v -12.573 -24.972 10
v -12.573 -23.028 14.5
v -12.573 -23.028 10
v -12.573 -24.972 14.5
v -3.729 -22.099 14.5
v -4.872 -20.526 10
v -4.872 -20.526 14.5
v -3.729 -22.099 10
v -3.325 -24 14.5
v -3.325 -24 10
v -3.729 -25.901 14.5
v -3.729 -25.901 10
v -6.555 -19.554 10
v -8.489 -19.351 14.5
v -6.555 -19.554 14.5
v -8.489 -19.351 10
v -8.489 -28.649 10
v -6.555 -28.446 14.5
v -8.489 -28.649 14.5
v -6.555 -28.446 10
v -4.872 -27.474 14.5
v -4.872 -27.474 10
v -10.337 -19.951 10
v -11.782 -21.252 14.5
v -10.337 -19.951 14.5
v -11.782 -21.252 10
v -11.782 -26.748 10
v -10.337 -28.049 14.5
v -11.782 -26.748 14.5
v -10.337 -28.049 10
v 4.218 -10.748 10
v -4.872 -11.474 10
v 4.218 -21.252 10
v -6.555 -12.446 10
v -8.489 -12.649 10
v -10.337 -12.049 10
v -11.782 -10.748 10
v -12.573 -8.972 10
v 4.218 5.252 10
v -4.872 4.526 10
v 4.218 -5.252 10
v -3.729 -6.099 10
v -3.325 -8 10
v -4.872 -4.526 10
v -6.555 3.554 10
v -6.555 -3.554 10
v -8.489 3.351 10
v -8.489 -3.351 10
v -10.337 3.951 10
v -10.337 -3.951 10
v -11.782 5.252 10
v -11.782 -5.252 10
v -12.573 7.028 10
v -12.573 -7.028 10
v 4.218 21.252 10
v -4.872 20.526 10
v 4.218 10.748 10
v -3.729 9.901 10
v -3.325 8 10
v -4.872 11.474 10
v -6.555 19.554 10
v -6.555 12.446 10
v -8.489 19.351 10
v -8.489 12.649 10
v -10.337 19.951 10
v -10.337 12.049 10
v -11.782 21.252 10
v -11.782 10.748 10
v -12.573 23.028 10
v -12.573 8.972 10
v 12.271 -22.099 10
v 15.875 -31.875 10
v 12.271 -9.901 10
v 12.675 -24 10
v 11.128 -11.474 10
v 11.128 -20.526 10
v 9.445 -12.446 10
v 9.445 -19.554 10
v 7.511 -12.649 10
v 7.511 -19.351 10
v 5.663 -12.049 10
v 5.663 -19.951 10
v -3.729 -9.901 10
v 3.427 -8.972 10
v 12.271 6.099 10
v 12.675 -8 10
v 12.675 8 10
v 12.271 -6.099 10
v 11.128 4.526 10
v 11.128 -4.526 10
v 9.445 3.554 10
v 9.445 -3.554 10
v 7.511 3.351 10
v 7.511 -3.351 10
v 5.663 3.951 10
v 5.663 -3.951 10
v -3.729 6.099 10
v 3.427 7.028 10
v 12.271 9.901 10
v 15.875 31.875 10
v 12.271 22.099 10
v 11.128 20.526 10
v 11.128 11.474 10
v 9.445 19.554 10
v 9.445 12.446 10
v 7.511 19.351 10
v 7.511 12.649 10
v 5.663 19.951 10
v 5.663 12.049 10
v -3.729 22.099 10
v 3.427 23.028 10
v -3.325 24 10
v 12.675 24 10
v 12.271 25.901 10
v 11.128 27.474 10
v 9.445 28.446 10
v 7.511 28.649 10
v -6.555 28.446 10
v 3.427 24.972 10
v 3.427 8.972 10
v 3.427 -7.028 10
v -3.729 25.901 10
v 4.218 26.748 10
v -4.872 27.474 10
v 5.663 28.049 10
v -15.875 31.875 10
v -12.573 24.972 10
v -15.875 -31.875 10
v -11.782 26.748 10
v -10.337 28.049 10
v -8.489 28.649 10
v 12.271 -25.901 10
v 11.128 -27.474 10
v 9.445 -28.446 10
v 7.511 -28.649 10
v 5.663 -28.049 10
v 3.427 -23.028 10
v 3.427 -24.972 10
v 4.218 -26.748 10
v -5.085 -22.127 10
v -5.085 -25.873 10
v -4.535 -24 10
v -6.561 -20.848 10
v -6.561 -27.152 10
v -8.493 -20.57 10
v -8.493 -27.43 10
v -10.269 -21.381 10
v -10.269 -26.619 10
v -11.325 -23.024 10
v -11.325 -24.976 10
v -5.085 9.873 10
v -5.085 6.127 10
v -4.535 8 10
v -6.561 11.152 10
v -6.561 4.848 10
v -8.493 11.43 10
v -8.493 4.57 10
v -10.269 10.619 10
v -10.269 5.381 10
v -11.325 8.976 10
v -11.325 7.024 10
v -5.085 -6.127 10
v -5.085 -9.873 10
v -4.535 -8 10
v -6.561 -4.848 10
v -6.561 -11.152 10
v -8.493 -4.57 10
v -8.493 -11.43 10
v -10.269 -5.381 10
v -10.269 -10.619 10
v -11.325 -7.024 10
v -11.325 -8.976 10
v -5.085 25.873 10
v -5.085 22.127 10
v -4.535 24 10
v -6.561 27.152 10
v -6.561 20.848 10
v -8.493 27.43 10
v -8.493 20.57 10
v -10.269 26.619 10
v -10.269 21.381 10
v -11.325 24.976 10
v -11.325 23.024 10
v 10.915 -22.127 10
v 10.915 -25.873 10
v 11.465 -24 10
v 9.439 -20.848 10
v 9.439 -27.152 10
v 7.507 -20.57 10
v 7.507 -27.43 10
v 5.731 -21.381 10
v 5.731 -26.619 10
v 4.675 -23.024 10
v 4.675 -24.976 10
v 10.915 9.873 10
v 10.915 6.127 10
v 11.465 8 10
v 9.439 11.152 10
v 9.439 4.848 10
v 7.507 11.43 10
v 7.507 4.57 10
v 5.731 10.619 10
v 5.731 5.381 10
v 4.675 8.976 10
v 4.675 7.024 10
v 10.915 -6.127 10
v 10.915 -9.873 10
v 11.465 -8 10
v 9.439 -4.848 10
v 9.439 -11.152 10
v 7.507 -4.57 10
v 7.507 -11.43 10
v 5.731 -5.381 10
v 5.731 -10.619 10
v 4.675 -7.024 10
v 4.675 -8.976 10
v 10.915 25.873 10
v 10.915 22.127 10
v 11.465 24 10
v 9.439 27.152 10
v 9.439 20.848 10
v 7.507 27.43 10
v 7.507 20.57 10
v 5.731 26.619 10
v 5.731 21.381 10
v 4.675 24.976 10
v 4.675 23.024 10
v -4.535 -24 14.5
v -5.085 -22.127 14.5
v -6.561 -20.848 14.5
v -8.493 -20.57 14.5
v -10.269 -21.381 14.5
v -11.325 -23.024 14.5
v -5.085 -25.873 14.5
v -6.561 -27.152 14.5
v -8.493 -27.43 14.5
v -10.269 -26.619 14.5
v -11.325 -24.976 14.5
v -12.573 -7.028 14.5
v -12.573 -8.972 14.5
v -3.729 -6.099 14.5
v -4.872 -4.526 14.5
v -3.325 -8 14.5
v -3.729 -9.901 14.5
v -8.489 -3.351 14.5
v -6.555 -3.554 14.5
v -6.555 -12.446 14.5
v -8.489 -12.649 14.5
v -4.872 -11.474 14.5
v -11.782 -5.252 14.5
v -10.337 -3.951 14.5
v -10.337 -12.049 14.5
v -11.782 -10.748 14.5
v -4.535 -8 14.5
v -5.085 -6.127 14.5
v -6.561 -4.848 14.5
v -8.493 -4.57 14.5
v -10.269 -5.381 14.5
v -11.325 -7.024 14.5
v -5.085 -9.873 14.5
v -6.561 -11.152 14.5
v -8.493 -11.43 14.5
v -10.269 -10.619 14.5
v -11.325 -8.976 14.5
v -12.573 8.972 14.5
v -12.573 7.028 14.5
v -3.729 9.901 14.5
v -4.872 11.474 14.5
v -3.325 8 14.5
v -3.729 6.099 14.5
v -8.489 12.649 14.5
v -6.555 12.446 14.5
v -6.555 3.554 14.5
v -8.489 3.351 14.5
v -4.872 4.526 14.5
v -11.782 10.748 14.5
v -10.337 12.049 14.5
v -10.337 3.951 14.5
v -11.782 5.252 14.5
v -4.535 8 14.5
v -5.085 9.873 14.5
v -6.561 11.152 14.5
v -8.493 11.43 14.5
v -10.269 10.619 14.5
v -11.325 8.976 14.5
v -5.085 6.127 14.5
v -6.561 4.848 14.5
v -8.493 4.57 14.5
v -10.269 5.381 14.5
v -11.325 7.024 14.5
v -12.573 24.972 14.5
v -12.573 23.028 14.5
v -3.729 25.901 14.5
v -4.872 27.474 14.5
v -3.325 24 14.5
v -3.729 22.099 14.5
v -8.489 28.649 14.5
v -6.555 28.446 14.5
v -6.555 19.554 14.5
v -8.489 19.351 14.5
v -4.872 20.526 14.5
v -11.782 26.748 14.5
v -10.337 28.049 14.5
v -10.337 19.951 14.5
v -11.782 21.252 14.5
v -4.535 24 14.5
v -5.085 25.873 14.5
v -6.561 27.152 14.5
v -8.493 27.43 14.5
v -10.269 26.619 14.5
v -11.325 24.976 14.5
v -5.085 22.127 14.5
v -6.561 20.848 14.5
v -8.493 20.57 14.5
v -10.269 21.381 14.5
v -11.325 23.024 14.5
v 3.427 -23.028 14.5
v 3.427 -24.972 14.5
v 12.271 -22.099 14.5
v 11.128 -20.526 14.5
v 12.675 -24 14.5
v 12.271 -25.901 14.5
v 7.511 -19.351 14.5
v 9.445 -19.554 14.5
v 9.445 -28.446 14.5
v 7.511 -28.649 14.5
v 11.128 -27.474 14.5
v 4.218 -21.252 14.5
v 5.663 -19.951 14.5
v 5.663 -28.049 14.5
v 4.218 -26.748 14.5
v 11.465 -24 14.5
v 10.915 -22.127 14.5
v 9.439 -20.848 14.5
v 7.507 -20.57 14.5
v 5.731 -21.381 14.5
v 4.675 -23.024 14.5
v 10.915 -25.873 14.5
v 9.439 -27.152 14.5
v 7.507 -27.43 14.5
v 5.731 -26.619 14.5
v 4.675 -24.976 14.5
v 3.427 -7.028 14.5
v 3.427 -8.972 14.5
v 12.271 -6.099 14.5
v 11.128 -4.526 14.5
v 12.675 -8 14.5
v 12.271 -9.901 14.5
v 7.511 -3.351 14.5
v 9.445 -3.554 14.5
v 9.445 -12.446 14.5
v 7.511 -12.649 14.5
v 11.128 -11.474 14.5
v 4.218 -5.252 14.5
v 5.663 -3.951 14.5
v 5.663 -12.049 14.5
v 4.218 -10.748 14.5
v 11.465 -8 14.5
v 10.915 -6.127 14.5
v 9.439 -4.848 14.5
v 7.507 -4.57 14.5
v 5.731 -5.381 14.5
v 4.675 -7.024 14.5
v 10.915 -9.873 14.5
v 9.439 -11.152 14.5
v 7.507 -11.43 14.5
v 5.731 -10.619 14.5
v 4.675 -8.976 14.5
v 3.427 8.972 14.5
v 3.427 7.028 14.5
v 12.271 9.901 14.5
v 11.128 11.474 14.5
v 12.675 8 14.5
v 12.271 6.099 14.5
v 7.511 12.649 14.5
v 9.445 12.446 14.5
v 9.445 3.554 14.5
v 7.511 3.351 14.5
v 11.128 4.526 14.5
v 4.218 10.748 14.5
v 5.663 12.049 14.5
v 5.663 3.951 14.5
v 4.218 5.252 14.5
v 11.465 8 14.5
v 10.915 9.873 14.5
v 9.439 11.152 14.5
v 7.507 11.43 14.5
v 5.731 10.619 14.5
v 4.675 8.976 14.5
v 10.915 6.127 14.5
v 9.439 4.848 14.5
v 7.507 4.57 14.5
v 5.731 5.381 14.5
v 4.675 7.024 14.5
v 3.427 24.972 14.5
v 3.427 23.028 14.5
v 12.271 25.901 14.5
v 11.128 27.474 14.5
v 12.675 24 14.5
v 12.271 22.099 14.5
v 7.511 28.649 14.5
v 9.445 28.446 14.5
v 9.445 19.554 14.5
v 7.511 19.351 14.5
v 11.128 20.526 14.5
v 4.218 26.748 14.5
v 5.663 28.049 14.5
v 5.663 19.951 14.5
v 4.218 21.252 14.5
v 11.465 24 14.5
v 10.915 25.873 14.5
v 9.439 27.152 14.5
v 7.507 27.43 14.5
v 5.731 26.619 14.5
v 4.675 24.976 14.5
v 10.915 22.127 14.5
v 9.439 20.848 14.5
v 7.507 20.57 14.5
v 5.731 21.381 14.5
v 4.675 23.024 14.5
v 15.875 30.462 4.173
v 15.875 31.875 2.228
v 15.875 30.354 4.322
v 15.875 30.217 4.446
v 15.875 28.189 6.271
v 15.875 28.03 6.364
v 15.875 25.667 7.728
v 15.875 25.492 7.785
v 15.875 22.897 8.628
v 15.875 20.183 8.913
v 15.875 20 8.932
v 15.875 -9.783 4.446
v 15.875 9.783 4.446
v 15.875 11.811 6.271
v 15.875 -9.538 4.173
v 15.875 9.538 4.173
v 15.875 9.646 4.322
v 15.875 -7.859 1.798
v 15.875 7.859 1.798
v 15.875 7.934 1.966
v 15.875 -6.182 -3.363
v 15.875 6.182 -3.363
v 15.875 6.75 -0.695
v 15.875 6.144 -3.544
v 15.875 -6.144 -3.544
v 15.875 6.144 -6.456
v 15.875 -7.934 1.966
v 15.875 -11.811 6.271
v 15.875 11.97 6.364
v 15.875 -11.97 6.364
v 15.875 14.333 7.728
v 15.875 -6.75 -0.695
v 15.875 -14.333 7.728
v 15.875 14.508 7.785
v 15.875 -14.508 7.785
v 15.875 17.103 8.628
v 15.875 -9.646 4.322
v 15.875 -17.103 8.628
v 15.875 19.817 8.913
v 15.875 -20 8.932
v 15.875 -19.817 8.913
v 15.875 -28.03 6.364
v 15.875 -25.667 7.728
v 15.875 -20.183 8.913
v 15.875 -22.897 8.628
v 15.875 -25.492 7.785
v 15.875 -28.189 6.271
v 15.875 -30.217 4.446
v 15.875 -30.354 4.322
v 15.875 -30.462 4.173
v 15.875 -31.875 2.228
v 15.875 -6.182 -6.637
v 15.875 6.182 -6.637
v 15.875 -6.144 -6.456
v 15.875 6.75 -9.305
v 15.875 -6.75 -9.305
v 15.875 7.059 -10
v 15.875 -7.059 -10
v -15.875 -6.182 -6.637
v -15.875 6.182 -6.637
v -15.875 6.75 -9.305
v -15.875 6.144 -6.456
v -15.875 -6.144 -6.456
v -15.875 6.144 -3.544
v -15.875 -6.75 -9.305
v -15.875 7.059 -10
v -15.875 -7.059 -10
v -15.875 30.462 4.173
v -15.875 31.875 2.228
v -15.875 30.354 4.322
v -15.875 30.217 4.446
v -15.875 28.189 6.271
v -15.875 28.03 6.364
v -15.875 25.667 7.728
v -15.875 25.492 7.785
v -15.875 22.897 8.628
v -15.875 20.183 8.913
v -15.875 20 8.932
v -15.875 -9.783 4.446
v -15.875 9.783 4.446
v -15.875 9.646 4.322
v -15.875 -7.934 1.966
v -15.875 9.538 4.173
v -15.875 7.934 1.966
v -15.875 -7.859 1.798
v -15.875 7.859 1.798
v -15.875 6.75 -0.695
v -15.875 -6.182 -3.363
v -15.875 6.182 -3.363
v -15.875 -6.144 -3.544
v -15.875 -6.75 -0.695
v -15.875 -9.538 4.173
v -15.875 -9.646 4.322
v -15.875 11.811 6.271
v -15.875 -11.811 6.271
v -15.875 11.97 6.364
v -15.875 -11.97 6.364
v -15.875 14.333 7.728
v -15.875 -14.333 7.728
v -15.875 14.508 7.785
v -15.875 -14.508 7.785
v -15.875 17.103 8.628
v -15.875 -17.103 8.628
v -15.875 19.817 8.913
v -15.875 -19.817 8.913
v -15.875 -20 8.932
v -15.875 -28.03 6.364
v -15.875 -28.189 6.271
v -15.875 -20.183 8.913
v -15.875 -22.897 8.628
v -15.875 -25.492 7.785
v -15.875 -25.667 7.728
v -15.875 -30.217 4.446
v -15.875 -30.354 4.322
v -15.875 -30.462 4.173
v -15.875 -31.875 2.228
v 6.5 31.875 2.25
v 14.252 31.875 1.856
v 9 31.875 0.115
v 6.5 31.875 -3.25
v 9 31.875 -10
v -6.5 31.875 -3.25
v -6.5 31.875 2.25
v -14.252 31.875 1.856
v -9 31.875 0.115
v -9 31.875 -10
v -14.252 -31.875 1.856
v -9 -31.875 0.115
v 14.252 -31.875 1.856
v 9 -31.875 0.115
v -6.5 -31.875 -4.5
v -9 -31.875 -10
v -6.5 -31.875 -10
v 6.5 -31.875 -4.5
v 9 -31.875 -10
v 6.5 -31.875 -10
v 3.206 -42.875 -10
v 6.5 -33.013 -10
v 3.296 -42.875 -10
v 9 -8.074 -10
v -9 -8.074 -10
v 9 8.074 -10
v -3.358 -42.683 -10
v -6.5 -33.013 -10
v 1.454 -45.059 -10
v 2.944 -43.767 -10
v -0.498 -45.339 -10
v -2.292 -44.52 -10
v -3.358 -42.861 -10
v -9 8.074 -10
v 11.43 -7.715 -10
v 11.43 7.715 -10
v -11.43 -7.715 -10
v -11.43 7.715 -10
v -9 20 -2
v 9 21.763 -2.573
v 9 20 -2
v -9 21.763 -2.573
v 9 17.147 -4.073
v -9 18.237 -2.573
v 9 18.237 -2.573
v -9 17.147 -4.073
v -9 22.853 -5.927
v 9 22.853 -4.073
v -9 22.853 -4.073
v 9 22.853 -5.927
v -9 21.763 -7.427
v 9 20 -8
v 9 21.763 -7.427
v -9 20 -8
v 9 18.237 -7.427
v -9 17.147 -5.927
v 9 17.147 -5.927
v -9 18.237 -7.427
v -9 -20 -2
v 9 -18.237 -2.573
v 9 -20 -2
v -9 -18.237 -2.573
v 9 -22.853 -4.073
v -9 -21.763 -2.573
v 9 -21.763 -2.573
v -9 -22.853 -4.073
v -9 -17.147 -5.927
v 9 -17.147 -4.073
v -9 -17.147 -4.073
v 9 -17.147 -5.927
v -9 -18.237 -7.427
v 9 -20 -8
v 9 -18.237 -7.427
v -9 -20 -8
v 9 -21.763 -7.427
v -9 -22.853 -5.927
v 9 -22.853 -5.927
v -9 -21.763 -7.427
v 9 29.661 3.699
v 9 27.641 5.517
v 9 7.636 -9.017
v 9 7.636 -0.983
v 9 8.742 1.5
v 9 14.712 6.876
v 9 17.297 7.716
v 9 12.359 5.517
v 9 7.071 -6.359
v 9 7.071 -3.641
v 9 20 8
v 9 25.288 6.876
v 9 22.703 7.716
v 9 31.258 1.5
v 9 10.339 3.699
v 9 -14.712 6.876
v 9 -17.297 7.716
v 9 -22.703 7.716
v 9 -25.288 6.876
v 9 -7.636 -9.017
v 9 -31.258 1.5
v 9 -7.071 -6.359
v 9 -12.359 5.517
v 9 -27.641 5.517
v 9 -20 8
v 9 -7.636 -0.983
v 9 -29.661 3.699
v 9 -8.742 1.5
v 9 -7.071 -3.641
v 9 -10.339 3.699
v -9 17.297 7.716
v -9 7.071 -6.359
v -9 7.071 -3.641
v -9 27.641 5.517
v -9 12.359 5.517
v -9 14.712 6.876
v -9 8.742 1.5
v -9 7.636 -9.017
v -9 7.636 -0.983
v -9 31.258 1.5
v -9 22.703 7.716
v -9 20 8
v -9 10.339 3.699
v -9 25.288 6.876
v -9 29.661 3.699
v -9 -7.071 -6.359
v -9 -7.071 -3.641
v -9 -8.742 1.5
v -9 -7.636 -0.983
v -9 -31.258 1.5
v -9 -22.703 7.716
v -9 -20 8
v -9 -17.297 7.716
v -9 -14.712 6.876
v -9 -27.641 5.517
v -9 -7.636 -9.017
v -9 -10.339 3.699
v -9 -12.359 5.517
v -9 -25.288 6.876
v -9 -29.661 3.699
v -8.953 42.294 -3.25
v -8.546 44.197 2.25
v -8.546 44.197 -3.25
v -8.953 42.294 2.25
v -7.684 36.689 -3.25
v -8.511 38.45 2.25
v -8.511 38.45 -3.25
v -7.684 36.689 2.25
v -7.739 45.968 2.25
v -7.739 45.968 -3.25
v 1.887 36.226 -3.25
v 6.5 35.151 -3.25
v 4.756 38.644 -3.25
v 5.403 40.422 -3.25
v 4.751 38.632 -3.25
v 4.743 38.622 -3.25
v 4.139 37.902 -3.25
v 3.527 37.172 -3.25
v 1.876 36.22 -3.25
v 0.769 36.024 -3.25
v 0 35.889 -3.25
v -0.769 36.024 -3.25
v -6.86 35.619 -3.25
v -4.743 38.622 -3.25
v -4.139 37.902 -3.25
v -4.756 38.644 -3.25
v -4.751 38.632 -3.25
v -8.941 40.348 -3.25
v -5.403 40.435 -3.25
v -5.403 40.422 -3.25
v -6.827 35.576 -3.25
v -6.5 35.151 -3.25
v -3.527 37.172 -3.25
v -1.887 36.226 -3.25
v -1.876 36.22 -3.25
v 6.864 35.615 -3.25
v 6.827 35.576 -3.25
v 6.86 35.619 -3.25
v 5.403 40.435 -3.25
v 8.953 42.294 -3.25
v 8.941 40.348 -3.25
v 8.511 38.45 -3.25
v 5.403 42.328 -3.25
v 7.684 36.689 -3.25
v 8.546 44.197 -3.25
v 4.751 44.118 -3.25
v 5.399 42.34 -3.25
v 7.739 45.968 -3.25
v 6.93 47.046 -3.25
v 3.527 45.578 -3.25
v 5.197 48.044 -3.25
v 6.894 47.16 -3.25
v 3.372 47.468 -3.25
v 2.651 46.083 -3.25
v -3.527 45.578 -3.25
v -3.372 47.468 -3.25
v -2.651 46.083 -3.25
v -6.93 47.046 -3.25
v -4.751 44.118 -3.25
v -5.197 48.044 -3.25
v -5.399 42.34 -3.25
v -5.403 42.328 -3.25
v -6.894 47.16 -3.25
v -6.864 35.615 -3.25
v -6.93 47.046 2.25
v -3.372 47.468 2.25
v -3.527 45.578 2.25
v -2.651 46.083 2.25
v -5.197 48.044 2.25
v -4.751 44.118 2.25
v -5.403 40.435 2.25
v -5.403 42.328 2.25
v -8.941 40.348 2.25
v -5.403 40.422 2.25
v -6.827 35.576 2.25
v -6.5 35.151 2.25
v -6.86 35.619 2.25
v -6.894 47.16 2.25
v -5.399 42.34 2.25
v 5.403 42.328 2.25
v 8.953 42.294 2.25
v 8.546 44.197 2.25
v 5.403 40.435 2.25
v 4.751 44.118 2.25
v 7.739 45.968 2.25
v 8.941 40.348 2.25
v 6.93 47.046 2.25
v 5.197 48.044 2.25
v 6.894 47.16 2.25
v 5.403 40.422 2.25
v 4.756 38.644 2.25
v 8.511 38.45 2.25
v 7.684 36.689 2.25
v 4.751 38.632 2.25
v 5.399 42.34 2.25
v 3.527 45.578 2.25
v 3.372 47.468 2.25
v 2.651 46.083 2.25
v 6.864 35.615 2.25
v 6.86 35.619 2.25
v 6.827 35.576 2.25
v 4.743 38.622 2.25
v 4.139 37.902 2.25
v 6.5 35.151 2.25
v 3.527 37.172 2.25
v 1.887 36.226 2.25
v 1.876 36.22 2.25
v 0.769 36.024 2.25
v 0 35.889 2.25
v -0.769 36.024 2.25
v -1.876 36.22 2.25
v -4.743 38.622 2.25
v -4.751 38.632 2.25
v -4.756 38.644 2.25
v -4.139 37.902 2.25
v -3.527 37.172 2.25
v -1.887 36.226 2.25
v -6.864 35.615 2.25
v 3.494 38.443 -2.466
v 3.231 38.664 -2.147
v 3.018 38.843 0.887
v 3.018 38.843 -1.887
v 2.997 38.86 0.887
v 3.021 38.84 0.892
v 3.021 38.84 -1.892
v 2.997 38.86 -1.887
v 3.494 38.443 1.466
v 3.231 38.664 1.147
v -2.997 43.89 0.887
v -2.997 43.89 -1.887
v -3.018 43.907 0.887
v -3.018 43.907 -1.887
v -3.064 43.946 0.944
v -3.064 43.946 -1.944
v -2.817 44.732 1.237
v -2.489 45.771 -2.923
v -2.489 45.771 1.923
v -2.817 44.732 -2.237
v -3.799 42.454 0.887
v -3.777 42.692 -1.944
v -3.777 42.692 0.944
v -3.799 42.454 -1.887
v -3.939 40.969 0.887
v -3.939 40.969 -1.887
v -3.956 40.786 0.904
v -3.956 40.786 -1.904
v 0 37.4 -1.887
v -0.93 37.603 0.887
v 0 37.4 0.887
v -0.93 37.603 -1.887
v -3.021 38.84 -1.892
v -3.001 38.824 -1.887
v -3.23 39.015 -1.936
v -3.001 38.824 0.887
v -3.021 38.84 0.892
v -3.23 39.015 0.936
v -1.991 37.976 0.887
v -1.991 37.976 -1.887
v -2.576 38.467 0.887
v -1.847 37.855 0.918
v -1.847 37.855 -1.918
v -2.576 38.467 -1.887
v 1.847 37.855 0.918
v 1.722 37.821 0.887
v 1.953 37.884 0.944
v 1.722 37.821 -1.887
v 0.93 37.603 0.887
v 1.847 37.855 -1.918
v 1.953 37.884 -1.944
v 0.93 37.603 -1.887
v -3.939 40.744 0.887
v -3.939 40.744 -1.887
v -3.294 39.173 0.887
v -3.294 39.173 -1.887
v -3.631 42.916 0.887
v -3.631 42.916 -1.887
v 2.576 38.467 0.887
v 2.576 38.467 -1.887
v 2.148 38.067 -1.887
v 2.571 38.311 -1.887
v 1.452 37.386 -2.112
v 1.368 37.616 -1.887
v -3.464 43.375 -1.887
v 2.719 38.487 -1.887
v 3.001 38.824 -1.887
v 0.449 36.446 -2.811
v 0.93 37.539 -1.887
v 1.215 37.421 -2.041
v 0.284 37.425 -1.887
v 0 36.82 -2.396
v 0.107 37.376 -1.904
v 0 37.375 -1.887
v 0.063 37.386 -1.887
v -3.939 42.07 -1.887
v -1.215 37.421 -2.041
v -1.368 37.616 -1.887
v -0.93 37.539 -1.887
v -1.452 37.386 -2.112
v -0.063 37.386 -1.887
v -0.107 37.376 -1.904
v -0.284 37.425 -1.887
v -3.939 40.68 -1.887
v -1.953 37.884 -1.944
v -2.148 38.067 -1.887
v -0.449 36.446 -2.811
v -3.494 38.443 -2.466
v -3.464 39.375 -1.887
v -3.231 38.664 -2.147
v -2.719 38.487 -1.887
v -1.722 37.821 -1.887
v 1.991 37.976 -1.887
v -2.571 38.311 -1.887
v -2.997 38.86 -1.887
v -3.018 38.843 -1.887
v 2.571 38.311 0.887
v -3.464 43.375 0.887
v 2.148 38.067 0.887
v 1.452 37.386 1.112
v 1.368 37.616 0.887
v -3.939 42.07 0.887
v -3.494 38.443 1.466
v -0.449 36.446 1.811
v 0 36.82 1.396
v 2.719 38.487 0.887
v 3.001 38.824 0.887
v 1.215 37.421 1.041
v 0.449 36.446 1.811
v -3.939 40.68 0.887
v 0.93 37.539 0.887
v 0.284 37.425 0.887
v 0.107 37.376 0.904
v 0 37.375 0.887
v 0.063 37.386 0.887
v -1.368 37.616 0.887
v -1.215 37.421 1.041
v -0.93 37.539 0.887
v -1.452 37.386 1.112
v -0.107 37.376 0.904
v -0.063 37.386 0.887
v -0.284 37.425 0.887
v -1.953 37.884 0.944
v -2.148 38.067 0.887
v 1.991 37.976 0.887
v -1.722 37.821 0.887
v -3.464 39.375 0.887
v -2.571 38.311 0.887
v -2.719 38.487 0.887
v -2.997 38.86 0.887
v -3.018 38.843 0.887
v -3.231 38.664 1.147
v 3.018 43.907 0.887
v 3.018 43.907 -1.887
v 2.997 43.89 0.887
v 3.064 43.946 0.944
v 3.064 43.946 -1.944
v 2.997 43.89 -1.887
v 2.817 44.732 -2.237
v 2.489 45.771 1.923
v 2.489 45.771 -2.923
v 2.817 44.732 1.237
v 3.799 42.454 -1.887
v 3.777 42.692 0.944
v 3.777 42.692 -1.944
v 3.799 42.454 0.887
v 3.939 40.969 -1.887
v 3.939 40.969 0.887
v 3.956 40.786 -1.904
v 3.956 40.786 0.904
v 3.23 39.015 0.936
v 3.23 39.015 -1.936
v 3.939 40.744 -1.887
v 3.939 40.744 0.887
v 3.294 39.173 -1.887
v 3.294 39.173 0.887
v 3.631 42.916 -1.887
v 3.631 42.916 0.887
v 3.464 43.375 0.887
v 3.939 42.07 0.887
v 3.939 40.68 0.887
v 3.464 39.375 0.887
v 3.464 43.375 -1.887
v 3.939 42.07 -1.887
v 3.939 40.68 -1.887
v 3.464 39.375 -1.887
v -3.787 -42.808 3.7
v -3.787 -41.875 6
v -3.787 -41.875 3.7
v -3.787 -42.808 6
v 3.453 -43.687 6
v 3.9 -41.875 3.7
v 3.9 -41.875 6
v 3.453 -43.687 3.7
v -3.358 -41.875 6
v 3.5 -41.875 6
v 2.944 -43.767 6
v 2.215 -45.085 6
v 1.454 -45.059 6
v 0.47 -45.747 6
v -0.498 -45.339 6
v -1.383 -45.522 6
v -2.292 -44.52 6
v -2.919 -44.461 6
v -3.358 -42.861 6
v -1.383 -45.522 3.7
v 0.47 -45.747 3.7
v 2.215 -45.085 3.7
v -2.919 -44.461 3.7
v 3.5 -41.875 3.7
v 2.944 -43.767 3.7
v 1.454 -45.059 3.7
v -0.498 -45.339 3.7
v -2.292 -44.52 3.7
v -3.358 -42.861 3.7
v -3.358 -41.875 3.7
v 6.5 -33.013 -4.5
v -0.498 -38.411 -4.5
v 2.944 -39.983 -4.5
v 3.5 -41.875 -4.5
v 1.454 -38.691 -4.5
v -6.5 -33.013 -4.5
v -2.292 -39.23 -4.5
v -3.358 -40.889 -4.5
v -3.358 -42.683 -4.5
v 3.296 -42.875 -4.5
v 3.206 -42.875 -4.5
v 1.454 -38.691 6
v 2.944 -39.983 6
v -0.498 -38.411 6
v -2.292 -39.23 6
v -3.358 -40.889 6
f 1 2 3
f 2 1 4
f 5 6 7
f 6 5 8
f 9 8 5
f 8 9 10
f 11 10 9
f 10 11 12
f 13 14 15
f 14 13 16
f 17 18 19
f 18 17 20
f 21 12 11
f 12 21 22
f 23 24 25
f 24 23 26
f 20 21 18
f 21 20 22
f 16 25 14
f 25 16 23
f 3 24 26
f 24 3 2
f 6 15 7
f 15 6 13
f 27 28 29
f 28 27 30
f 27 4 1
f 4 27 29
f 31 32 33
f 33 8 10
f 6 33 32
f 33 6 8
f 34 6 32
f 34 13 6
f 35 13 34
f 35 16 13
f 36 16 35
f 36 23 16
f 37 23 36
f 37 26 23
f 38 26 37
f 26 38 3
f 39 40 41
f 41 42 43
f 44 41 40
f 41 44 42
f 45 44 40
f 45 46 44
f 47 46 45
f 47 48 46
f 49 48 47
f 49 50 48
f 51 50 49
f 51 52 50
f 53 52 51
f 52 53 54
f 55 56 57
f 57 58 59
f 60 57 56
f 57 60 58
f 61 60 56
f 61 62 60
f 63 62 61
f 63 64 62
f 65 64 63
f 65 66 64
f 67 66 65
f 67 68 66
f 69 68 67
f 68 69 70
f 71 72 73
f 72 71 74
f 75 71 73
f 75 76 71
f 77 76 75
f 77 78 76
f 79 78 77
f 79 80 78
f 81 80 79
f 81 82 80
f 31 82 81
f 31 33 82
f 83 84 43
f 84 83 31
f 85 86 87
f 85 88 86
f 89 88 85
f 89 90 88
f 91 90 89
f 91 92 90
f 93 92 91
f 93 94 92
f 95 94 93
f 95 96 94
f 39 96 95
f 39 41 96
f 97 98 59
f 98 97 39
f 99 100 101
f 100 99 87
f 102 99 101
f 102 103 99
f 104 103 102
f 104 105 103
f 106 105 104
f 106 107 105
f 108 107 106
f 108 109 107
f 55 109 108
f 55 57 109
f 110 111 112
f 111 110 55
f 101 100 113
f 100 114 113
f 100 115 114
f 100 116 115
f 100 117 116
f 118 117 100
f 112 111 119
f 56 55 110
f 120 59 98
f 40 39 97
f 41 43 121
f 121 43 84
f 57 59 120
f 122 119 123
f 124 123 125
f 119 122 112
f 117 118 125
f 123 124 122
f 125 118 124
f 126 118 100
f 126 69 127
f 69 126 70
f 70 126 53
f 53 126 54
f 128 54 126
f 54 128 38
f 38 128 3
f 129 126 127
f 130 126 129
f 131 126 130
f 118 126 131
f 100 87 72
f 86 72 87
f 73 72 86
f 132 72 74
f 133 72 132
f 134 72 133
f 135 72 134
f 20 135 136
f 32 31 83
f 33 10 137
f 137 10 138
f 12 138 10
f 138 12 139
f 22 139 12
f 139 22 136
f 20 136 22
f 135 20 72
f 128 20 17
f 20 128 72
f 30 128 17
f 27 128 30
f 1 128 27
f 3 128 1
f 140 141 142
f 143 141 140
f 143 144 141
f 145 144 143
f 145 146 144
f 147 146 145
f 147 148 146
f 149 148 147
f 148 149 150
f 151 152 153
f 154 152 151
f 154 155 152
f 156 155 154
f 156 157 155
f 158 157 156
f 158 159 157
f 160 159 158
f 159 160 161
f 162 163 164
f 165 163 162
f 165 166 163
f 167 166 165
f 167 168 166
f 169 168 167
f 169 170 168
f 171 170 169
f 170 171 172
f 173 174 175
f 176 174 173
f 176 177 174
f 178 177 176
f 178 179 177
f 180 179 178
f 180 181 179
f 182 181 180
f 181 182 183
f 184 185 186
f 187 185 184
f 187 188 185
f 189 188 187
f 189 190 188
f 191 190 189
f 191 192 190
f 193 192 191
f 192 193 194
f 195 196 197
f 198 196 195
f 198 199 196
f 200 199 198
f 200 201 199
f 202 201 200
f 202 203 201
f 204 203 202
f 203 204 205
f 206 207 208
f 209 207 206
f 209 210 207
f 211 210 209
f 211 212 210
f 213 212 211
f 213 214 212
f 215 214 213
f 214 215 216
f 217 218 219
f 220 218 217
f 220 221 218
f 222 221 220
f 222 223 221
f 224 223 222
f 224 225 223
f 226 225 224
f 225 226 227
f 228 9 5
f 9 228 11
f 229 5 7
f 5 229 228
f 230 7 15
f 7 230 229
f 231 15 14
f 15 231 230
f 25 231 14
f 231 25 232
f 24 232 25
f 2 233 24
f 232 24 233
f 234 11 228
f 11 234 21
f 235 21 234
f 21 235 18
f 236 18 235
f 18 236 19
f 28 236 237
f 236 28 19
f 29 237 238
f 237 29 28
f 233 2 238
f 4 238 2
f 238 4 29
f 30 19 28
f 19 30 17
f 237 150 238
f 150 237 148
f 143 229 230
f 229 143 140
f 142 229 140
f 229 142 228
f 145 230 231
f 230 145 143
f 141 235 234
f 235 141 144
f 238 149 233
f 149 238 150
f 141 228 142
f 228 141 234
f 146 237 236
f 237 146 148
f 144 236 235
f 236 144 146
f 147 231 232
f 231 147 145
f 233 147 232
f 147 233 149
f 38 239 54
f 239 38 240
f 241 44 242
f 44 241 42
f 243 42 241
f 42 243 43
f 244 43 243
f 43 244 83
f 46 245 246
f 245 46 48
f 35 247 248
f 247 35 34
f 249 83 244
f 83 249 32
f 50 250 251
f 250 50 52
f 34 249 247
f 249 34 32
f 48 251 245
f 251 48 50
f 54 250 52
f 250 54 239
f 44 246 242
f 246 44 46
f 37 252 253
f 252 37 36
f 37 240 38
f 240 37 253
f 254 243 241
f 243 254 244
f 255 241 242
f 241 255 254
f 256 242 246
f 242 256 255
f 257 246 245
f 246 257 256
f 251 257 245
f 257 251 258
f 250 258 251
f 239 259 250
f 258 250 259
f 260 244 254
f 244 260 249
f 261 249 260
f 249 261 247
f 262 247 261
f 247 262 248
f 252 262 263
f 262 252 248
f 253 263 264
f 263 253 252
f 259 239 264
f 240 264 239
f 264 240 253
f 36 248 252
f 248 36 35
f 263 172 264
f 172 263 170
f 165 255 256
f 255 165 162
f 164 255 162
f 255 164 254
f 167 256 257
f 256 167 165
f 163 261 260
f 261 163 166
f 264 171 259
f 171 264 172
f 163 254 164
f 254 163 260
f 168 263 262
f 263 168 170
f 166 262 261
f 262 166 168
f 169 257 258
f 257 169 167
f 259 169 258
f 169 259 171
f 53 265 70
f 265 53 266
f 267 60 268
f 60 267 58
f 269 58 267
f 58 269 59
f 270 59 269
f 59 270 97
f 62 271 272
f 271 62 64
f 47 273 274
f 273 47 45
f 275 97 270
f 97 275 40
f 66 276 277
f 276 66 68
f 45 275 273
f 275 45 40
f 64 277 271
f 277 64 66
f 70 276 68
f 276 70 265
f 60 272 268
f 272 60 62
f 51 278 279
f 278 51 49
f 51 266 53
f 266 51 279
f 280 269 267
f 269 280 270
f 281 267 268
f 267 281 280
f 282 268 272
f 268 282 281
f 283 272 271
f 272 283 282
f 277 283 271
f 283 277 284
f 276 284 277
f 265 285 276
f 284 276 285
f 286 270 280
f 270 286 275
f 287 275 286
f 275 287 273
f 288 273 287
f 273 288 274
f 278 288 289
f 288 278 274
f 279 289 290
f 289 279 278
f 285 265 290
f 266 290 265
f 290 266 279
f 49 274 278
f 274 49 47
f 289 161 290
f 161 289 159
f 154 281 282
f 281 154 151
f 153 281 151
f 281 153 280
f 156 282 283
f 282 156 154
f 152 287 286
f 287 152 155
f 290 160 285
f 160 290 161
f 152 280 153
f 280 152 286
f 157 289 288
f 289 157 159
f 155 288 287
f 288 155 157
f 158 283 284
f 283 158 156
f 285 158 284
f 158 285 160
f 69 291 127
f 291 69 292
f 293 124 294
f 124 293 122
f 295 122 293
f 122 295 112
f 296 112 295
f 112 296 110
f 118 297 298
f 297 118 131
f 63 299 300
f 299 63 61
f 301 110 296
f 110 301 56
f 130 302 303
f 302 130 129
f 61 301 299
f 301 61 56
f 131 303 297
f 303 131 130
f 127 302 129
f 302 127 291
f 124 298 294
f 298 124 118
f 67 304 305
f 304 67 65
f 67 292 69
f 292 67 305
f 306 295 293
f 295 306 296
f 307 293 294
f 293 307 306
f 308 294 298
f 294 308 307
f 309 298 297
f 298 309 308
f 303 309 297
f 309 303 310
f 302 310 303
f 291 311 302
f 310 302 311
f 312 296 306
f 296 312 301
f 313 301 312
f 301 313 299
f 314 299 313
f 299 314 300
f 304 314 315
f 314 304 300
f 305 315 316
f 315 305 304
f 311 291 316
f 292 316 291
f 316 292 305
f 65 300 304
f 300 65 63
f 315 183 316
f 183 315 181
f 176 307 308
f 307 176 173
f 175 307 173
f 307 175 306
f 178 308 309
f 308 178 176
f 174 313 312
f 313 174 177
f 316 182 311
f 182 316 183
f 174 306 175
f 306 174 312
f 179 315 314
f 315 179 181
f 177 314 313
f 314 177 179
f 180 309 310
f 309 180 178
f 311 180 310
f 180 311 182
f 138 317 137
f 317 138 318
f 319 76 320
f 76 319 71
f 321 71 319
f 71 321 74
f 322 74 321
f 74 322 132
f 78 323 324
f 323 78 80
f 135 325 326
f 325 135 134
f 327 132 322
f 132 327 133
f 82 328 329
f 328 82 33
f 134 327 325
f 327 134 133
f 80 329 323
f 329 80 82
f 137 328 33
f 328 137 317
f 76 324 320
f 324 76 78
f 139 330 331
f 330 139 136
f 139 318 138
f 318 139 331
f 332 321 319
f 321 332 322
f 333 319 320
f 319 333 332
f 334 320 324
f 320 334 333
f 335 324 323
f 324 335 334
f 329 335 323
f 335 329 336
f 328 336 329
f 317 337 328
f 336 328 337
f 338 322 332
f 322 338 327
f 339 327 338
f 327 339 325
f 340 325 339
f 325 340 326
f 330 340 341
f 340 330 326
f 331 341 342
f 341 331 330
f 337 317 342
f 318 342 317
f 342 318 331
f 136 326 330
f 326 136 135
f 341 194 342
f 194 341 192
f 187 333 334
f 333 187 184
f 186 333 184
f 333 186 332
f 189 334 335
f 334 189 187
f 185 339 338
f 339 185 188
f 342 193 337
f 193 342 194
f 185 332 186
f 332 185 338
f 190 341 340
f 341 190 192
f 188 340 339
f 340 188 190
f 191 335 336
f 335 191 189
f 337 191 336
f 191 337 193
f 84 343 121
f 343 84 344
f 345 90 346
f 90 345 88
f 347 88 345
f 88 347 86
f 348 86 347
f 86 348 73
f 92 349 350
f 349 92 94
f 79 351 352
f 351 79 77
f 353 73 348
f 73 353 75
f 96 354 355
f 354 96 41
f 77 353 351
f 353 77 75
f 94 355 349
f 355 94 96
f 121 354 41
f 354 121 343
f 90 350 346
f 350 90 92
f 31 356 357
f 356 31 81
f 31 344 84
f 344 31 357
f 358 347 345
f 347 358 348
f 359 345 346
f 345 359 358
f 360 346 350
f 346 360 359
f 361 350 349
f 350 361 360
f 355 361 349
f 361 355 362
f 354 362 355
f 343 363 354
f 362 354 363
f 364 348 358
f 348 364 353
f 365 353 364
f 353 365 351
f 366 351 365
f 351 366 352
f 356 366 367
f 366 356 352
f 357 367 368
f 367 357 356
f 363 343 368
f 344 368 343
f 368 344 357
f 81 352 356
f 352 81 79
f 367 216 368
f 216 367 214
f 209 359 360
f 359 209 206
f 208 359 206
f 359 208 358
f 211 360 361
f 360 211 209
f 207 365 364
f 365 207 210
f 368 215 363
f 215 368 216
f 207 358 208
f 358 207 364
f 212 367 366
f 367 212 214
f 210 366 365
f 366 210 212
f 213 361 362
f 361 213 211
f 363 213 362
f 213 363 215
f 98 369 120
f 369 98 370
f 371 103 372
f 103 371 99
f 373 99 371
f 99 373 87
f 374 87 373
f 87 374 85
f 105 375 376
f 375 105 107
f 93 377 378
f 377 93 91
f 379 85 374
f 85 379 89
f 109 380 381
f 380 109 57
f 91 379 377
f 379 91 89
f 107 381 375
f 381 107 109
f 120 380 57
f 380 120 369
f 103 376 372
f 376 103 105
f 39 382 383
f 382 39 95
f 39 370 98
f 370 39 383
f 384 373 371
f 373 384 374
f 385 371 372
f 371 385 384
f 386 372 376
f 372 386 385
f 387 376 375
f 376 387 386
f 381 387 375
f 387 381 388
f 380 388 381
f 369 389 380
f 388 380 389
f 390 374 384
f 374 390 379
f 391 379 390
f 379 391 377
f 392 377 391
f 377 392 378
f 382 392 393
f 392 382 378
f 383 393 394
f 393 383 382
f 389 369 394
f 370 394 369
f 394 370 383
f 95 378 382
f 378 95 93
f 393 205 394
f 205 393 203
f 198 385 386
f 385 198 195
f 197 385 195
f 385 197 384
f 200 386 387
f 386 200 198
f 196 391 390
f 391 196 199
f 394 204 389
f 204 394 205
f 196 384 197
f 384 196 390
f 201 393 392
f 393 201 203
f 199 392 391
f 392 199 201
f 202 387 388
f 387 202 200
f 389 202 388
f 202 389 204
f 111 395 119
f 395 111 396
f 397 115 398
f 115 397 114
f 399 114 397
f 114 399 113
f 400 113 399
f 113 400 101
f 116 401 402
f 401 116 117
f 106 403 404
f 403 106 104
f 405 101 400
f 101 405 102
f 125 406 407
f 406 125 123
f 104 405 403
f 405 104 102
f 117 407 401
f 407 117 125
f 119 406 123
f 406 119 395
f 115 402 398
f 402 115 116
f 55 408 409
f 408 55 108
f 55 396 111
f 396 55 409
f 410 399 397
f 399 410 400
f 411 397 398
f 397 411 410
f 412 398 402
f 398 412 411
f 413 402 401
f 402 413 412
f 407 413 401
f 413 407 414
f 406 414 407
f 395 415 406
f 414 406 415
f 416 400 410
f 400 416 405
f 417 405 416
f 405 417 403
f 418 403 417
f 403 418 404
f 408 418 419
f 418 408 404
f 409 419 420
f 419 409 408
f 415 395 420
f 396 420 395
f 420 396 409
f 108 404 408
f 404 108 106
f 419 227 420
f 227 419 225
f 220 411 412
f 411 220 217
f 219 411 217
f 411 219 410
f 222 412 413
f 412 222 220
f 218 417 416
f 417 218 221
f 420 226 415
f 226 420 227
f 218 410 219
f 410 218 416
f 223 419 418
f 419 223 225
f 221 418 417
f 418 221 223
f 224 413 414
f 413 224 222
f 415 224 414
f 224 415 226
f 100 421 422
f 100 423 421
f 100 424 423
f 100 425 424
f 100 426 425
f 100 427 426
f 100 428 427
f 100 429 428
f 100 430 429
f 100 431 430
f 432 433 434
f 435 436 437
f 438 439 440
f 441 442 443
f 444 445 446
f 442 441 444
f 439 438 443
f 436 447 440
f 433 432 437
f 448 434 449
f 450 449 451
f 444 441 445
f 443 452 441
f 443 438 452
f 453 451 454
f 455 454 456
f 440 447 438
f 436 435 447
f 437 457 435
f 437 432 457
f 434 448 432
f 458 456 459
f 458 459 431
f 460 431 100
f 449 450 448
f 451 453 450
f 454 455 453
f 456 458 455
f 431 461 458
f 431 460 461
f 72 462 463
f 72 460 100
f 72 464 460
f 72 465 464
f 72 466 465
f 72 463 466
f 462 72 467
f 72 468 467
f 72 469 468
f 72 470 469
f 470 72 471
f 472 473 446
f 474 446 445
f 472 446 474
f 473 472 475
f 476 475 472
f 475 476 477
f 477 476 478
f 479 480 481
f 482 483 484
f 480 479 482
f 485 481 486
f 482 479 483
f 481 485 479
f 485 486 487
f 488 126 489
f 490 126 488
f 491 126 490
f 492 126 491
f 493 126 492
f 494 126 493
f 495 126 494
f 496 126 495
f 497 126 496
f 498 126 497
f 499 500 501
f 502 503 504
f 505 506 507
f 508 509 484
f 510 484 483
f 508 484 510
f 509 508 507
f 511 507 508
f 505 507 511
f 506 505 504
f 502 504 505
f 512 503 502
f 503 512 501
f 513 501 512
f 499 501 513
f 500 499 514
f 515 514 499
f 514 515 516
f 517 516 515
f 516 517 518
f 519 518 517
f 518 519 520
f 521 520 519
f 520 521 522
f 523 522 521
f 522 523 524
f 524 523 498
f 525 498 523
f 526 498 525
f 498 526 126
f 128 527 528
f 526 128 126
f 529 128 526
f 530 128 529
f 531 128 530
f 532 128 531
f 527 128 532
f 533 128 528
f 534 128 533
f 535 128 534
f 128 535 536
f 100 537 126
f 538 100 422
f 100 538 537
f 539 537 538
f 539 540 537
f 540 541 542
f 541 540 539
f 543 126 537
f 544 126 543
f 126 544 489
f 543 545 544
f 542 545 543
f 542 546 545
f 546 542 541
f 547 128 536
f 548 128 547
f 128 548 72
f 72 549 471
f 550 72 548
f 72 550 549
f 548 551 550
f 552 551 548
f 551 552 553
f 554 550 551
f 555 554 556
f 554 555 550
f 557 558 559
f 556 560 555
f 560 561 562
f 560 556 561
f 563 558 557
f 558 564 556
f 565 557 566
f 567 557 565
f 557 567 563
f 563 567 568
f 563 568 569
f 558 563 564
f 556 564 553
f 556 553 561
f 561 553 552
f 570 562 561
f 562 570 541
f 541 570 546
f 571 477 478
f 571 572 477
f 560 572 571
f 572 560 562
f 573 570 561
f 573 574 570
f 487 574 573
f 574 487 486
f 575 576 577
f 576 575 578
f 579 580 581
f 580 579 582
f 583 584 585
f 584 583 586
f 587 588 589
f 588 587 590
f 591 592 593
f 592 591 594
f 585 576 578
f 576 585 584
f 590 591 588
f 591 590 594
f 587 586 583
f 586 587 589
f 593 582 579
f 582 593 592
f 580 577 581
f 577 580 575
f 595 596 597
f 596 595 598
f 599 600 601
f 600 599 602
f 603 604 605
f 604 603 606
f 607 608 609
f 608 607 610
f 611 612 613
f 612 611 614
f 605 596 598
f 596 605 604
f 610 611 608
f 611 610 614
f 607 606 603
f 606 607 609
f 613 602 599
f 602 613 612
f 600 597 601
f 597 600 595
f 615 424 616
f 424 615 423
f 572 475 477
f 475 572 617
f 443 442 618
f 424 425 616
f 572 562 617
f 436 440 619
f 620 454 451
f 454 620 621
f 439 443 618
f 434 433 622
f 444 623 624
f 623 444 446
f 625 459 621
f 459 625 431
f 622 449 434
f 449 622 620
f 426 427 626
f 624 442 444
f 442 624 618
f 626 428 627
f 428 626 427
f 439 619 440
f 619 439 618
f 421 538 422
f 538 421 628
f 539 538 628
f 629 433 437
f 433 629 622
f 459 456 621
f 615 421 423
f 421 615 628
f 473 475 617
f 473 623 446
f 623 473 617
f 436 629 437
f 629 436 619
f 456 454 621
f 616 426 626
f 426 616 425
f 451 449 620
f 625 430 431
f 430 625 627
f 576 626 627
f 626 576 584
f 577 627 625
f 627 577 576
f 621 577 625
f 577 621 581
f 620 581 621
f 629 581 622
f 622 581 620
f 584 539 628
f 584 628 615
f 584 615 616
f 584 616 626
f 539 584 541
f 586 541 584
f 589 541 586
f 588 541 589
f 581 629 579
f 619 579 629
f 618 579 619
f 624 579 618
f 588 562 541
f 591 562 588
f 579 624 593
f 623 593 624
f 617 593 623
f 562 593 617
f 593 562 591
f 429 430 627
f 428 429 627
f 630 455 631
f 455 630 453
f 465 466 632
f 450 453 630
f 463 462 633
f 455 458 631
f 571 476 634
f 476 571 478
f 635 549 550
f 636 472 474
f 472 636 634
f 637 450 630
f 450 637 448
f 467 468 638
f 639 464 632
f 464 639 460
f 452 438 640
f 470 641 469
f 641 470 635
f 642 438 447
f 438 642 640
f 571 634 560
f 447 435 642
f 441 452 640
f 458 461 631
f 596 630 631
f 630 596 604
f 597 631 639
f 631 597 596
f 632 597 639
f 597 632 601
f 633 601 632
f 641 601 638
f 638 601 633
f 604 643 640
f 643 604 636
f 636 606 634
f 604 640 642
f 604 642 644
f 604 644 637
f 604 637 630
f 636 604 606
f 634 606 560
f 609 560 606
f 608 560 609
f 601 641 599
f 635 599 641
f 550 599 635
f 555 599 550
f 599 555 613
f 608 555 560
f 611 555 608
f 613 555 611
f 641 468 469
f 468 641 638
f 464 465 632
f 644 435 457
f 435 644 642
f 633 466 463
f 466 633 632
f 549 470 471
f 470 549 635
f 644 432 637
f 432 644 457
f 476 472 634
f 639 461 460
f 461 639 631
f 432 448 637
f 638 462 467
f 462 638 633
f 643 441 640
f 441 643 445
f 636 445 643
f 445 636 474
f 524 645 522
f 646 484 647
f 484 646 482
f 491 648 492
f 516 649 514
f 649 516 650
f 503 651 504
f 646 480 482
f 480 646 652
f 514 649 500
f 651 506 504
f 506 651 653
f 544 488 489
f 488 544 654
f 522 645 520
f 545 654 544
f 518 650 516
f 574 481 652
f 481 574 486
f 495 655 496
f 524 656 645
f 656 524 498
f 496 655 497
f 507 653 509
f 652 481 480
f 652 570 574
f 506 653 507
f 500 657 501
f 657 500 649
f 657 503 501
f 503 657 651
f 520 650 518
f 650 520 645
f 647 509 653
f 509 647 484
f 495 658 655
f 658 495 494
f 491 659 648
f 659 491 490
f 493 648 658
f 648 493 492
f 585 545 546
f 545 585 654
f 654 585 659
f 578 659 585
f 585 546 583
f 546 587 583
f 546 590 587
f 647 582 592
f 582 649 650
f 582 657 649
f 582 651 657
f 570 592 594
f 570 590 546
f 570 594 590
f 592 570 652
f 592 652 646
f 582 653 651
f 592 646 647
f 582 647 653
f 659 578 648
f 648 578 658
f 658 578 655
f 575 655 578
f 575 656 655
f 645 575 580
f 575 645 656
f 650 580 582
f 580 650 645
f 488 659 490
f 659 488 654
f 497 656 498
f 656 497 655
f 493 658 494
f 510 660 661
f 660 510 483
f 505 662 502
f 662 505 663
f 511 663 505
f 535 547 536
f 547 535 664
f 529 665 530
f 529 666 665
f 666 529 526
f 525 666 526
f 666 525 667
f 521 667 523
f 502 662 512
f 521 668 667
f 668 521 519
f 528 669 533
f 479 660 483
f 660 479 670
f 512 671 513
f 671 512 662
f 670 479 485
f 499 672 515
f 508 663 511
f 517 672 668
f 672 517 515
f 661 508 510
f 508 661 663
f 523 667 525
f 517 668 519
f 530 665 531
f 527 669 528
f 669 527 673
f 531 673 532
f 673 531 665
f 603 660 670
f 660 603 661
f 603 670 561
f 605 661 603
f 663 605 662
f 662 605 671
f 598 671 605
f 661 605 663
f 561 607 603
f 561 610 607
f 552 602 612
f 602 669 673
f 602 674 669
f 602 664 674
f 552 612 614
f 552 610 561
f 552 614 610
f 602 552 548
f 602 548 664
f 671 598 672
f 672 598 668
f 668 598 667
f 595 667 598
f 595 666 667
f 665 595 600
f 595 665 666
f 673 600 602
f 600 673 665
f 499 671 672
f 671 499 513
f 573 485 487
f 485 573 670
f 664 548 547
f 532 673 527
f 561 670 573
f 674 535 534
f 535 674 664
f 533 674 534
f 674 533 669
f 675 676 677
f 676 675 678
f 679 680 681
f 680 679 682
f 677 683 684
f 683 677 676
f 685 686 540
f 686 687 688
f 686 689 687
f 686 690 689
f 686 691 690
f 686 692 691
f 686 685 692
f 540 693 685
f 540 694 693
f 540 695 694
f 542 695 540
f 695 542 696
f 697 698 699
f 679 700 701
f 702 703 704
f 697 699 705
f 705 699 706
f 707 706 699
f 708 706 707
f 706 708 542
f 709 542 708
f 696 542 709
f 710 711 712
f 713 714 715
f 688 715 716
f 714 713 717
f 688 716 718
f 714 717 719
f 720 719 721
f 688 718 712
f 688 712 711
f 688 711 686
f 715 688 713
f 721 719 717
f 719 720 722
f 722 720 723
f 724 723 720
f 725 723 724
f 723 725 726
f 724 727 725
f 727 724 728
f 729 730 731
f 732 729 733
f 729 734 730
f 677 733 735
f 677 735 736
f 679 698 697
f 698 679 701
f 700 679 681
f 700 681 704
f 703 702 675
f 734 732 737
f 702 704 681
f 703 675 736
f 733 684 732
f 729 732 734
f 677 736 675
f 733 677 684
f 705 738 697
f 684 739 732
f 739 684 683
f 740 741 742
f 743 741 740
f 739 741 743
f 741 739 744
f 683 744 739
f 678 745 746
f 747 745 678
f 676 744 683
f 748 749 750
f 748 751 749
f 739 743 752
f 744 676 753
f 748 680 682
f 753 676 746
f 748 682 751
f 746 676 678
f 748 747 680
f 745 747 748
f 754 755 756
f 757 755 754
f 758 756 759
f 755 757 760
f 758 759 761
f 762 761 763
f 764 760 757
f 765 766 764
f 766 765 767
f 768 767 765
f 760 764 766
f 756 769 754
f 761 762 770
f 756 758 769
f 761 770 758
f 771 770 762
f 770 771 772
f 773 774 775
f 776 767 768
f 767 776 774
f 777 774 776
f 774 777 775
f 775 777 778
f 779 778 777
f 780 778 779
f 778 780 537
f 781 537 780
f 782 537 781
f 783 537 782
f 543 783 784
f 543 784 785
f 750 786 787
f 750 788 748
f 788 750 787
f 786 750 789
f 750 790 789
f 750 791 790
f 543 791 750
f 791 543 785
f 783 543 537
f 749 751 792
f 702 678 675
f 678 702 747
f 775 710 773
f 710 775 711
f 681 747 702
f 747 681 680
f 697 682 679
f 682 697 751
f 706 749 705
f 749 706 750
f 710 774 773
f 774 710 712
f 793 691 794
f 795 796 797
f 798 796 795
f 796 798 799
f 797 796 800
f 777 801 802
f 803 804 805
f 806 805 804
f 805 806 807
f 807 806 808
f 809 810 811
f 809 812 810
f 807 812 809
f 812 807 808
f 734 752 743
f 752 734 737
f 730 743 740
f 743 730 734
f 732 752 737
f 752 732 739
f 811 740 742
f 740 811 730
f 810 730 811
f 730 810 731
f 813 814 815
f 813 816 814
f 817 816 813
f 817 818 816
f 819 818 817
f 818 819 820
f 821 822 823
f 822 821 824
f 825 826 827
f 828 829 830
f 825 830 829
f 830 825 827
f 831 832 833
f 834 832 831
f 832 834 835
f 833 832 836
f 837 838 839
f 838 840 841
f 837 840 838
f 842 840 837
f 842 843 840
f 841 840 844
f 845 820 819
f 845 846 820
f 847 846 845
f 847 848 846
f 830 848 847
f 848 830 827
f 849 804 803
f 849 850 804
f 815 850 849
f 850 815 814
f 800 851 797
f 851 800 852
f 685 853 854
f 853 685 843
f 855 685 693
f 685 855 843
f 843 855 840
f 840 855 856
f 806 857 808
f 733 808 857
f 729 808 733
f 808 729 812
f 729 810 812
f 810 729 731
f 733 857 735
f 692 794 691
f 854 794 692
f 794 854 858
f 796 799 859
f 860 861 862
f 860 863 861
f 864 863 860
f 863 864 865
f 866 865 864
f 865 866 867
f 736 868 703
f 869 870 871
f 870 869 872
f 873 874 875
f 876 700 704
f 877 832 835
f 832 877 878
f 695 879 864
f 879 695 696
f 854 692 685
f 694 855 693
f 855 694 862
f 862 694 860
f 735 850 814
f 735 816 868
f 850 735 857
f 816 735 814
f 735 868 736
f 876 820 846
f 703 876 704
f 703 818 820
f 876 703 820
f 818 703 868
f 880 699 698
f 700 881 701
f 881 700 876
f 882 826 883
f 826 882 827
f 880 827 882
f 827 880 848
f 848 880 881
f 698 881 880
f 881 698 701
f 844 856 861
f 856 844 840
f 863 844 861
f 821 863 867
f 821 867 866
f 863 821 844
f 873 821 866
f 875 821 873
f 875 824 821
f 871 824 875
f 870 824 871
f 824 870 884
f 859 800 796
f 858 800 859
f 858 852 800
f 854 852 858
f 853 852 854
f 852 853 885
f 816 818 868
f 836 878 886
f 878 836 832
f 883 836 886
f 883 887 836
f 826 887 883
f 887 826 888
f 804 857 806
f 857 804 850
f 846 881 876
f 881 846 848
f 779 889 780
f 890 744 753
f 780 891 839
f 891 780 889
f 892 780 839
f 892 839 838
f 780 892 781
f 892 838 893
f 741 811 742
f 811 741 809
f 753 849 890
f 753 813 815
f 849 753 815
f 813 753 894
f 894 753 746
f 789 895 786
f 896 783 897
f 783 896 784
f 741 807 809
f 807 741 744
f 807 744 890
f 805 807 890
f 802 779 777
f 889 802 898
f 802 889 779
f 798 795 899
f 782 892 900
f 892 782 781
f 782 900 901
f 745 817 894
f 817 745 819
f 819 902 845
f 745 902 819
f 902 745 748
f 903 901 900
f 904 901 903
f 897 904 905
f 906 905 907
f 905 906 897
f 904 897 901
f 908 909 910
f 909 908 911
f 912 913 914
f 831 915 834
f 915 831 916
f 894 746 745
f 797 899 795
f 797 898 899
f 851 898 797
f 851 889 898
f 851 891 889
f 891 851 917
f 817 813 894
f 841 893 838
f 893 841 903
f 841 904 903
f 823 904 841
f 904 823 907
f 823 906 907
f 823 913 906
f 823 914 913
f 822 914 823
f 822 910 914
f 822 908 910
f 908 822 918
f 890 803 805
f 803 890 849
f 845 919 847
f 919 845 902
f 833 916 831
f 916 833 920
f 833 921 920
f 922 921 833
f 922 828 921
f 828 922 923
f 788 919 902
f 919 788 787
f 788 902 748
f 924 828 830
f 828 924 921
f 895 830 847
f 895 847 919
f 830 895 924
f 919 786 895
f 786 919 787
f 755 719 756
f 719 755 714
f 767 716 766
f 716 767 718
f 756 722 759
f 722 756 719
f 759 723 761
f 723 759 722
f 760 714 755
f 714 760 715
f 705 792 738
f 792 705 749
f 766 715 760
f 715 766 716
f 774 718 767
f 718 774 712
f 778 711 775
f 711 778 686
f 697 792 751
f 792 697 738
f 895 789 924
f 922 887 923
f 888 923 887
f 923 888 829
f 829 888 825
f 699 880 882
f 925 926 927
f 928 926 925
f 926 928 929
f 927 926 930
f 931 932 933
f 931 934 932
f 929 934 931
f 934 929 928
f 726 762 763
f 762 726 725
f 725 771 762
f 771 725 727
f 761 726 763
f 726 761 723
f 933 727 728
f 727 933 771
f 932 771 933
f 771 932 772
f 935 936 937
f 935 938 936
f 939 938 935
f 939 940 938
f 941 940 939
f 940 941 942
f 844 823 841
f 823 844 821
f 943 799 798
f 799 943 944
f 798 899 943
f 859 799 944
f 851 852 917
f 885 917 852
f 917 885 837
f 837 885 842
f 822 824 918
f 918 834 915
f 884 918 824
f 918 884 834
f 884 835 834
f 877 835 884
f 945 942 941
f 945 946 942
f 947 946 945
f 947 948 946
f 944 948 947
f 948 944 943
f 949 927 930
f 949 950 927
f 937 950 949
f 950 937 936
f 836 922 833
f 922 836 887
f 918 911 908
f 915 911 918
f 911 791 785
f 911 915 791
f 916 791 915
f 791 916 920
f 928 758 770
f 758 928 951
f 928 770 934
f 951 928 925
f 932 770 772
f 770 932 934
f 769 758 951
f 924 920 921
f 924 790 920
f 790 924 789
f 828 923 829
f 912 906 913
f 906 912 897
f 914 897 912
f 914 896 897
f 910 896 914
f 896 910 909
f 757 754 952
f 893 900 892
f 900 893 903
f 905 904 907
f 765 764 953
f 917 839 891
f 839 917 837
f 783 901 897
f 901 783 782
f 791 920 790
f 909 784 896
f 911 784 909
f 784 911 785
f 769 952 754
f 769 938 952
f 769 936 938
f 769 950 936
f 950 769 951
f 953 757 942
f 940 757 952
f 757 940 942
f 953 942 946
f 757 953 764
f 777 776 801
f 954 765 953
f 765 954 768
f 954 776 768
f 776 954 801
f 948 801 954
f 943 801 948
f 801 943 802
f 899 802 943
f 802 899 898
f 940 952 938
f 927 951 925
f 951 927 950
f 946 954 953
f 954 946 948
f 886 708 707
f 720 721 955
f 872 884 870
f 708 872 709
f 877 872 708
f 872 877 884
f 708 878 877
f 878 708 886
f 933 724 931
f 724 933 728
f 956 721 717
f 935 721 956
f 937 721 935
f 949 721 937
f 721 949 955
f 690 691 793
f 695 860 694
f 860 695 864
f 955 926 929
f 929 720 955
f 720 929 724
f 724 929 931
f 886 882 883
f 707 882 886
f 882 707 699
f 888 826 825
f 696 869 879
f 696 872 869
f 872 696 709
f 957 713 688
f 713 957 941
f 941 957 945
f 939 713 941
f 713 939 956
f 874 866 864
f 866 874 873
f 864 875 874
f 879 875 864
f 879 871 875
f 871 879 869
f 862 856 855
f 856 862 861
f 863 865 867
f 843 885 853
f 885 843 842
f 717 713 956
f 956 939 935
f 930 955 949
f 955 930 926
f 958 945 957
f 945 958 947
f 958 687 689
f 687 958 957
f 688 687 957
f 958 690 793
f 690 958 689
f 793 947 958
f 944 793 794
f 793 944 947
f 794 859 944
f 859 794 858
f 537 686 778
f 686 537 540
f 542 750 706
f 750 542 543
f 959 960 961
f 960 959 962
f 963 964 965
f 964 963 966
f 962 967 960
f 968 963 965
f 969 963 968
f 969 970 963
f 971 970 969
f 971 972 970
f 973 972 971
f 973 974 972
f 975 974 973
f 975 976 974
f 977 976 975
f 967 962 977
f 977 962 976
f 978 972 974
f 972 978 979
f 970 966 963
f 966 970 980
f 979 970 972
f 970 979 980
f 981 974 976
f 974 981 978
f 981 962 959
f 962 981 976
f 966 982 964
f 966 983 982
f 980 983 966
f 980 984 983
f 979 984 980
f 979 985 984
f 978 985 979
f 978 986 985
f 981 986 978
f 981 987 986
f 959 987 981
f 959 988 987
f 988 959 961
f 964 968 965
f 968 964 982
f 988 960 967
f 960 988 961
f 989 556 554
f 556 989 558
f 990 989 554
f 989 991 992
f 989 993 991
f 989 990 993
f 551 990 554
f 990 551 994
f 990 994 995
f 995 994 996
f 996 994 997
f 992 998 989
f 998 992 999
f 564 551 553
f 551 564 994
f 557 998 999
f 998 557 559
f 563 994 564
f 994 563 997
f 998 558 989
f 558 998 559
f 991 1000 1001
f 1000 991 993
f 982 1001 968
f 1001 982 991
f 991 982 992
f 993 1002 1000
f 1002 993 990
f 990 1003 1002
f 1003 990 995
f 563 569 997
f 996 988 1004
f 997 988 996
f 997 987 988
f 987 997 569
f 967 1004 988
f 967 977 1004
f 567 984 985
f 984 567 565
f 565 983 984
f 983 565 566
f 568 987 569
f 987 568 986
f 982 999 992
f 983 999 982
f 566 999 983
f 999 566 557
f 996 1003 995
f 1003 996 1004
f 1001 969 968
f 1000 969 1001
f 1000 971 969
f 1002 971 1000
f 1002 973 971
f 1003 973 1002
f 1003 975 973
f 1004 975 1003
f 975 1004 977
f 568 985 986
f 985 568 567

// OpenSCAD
sf = 1.0;

module duplo_nipple(outer = 9.35, inner = 6.93, height = 4.5)
{
  difference()
  {
    cylinder(height*sf,outer*sf/2,outer*sf/2,center=true);
    cylinder(height*sf+1,inner*sf/2,inner*sf/2,center=true);
  }
}

module duplo_top(x = 2, y = 4, spacing = 16.0, parimeter = 3.2+9.35/2, height = 4.5, thickness = 2)
{
  union()
  {
    for (i = [0:x-1]) 
    {
      for (j = [0:y-1])
      {
        translate([sf*((i-(x-1)/2)*spacing),sf*((j-(y-1)/2)*spacing),(height+thickness)/2]) duplo_nipple();
      }
    }
    cube([sf*(x-1)*spacing+2*parimeter,sf*(y-1)*spacing+2*parimeter,sf*thickness],center=true);
  }
}

module half_hook(inner_offset=0.2)
{
  outer_diameter = 18.0;
  thickness = 5.5;
  inner_diameter = 7.8+inner_offset;
  wall_thinkness = (outer_diameter-inner_diameter)/2;
  difference()
  {
    union()
    {
      difference()
      {
        cylinder(thickness*sf,outer_diameter*sf/2,outer_diameter*sf/2,center=true);
        translate([sf*(outer_diameter)/4,0,0]) cube([sf*outer_diameter/2,sf*outer_diameter,sf*thickness+1],center=true);
      }
      translate([0,sf*(inner_diameter/2+wall_thinkness/2),0]) cylinder(thickness*sf,sf*wall_thinkness/2,sf*wall_thinkness/2,center=true);
    }
    cylinder(thickness*sf+1,inner_diameter*sf/2,inner_diameter*sf/2,center=true);
    translate([0,0,-(thickness*3+0.1)*sf/8]) cylinder(thickness*sf/4,(inner_diameter+3)*sf/2,inner_diameter*sf/2,center=true);
    translate([0,0,(thickness*3+0.1)*sf/8]) cylinder(thickness*sf/4,inner_diameter*sf/2,(inner_diameter+3)*sf/2,center=true);
  
  }
}

module hook_1()
{
  angle = 50;
  attach_width = 4;
  attach_length = 13;
  attach_thickness = 5.5;
  union()
  {
    rotate([0,0,angle]) half_hook();
    rotate([0,0,-angle]) rotate([0,180,0]) half_hook();
    translate([0,-sf*7.5,0])  cube([sf*attach_length,sf*attach_width,sf*attach_thickness],center=true);
  }
  //%cube([sf*6.35,sf*20,sf*6],center=true);
}

module hook_2()
{
  hook_diameter = 7.0;
  latch_diameter = 7.8;
  latch_thickness = 2.3;
  height = 16;
  base_thinkness = 7.0;
  attach_width = 11;
  attach_length = 13;
  attach_thickness = 5.5;
  translate([0,0,-sf*1.5]) 
  union()
  {
    cylinder(sf*height,sf*hook_diameter/2,sf*hook_diameter/2,center=true);
    translate([0,0,sf*(height-latch_thickness)/2]) 
    difference()
    {
      cylinder(sf*latch_thickness,sf*latch_diameter/2,sf*latch_diameter/2,center=true);
      translate([0,sf*latch_diameter/4,0]) cube([sf*latch_diameter,sf*latch_diameter/2,sf*latch_thickness+1],center=true);
    }
    translate([0,sf*4.5,-sf*(height-attach_thickness)/2])  
    difference()
    {
      cube([sf*attach_length,sf*attach_width,sf*attach_thickness],center=true);
      translate([-8.5,0,0]) rotate([0,0,18]) cube([sf*attach_length/2,sf*attach_width*2,sf*attach_thickness+1],center=true);
      translate([8.5,0,0]) rotate([0,0,-18]) cube([sf*attach_length/2,sf*attach_width*2,sf*attach_thickness+1],center=true);
    
    }
  }
}

module train_car(length = 63.75, wheel_length = 40, width = 31.75, height = 20, hole = 6.0)
{
  wheel_well = 26;
  well_depth = (width - 19)/2;
  difference()
  {
    union()
    {
      cube([sf*width,sf*length,sf*height],center=true);
      translate([0,0,sf*(height-2)/2]) duplo_top();
    }
    
    translate([0,sf*wheel_length/2,-sf*5]) rotate([0,90,0]) cylinder(width*sf,hole*sf/2,hole*sf/2,center=true);
    translate([0,-sf*wheel_length/2,-sf*5]) rotate([0,90,0]) cylinder(width*sf,hole*sf/2,hole*sf/2,center=true);
    
    translate([sf*(19+well_depth)/2,sf*wheel_length/2,-sf*5]) rotate([0,90,0]) cylinder(well_depth*sf+1,wheel_well*sf/2,(wheel_well+2)*sf/2,center=true);
    translate([sf*(19+well_depth)/2,-sf*wheel_length/2,-sf*5]) rotate([0,90,0]) cylinder(well_depth*sf+1,wheel_well*sf/2,(wheel_well+2)*sf/2,center=true);
    translate([-sf*(19+well_depth)/2,sf*wheel_length/2,-sf*5]) rotate([0,90,0]) cylinder(well_depth*sf+1,(wheel_well+2)*sf/2,wheel_well*sf/2,center=true);
    translate([-sf*(19+well_depth)/2,-sf*wheel_length/2,-sf*5]) rotate([0,90,0]) cylinder(well_depth*sf+1,(wheel_well+2)*sf/2,wheel_well*sf/2,center=true);
   
  }
  hook_height = -0.5;
  translate([0,sf*(length/2+9.5),sf*hook_height]) hook_1();
  translate([0,-sf*(length/2+10),sf*hook_height]) hook_2();
}

train_car();
